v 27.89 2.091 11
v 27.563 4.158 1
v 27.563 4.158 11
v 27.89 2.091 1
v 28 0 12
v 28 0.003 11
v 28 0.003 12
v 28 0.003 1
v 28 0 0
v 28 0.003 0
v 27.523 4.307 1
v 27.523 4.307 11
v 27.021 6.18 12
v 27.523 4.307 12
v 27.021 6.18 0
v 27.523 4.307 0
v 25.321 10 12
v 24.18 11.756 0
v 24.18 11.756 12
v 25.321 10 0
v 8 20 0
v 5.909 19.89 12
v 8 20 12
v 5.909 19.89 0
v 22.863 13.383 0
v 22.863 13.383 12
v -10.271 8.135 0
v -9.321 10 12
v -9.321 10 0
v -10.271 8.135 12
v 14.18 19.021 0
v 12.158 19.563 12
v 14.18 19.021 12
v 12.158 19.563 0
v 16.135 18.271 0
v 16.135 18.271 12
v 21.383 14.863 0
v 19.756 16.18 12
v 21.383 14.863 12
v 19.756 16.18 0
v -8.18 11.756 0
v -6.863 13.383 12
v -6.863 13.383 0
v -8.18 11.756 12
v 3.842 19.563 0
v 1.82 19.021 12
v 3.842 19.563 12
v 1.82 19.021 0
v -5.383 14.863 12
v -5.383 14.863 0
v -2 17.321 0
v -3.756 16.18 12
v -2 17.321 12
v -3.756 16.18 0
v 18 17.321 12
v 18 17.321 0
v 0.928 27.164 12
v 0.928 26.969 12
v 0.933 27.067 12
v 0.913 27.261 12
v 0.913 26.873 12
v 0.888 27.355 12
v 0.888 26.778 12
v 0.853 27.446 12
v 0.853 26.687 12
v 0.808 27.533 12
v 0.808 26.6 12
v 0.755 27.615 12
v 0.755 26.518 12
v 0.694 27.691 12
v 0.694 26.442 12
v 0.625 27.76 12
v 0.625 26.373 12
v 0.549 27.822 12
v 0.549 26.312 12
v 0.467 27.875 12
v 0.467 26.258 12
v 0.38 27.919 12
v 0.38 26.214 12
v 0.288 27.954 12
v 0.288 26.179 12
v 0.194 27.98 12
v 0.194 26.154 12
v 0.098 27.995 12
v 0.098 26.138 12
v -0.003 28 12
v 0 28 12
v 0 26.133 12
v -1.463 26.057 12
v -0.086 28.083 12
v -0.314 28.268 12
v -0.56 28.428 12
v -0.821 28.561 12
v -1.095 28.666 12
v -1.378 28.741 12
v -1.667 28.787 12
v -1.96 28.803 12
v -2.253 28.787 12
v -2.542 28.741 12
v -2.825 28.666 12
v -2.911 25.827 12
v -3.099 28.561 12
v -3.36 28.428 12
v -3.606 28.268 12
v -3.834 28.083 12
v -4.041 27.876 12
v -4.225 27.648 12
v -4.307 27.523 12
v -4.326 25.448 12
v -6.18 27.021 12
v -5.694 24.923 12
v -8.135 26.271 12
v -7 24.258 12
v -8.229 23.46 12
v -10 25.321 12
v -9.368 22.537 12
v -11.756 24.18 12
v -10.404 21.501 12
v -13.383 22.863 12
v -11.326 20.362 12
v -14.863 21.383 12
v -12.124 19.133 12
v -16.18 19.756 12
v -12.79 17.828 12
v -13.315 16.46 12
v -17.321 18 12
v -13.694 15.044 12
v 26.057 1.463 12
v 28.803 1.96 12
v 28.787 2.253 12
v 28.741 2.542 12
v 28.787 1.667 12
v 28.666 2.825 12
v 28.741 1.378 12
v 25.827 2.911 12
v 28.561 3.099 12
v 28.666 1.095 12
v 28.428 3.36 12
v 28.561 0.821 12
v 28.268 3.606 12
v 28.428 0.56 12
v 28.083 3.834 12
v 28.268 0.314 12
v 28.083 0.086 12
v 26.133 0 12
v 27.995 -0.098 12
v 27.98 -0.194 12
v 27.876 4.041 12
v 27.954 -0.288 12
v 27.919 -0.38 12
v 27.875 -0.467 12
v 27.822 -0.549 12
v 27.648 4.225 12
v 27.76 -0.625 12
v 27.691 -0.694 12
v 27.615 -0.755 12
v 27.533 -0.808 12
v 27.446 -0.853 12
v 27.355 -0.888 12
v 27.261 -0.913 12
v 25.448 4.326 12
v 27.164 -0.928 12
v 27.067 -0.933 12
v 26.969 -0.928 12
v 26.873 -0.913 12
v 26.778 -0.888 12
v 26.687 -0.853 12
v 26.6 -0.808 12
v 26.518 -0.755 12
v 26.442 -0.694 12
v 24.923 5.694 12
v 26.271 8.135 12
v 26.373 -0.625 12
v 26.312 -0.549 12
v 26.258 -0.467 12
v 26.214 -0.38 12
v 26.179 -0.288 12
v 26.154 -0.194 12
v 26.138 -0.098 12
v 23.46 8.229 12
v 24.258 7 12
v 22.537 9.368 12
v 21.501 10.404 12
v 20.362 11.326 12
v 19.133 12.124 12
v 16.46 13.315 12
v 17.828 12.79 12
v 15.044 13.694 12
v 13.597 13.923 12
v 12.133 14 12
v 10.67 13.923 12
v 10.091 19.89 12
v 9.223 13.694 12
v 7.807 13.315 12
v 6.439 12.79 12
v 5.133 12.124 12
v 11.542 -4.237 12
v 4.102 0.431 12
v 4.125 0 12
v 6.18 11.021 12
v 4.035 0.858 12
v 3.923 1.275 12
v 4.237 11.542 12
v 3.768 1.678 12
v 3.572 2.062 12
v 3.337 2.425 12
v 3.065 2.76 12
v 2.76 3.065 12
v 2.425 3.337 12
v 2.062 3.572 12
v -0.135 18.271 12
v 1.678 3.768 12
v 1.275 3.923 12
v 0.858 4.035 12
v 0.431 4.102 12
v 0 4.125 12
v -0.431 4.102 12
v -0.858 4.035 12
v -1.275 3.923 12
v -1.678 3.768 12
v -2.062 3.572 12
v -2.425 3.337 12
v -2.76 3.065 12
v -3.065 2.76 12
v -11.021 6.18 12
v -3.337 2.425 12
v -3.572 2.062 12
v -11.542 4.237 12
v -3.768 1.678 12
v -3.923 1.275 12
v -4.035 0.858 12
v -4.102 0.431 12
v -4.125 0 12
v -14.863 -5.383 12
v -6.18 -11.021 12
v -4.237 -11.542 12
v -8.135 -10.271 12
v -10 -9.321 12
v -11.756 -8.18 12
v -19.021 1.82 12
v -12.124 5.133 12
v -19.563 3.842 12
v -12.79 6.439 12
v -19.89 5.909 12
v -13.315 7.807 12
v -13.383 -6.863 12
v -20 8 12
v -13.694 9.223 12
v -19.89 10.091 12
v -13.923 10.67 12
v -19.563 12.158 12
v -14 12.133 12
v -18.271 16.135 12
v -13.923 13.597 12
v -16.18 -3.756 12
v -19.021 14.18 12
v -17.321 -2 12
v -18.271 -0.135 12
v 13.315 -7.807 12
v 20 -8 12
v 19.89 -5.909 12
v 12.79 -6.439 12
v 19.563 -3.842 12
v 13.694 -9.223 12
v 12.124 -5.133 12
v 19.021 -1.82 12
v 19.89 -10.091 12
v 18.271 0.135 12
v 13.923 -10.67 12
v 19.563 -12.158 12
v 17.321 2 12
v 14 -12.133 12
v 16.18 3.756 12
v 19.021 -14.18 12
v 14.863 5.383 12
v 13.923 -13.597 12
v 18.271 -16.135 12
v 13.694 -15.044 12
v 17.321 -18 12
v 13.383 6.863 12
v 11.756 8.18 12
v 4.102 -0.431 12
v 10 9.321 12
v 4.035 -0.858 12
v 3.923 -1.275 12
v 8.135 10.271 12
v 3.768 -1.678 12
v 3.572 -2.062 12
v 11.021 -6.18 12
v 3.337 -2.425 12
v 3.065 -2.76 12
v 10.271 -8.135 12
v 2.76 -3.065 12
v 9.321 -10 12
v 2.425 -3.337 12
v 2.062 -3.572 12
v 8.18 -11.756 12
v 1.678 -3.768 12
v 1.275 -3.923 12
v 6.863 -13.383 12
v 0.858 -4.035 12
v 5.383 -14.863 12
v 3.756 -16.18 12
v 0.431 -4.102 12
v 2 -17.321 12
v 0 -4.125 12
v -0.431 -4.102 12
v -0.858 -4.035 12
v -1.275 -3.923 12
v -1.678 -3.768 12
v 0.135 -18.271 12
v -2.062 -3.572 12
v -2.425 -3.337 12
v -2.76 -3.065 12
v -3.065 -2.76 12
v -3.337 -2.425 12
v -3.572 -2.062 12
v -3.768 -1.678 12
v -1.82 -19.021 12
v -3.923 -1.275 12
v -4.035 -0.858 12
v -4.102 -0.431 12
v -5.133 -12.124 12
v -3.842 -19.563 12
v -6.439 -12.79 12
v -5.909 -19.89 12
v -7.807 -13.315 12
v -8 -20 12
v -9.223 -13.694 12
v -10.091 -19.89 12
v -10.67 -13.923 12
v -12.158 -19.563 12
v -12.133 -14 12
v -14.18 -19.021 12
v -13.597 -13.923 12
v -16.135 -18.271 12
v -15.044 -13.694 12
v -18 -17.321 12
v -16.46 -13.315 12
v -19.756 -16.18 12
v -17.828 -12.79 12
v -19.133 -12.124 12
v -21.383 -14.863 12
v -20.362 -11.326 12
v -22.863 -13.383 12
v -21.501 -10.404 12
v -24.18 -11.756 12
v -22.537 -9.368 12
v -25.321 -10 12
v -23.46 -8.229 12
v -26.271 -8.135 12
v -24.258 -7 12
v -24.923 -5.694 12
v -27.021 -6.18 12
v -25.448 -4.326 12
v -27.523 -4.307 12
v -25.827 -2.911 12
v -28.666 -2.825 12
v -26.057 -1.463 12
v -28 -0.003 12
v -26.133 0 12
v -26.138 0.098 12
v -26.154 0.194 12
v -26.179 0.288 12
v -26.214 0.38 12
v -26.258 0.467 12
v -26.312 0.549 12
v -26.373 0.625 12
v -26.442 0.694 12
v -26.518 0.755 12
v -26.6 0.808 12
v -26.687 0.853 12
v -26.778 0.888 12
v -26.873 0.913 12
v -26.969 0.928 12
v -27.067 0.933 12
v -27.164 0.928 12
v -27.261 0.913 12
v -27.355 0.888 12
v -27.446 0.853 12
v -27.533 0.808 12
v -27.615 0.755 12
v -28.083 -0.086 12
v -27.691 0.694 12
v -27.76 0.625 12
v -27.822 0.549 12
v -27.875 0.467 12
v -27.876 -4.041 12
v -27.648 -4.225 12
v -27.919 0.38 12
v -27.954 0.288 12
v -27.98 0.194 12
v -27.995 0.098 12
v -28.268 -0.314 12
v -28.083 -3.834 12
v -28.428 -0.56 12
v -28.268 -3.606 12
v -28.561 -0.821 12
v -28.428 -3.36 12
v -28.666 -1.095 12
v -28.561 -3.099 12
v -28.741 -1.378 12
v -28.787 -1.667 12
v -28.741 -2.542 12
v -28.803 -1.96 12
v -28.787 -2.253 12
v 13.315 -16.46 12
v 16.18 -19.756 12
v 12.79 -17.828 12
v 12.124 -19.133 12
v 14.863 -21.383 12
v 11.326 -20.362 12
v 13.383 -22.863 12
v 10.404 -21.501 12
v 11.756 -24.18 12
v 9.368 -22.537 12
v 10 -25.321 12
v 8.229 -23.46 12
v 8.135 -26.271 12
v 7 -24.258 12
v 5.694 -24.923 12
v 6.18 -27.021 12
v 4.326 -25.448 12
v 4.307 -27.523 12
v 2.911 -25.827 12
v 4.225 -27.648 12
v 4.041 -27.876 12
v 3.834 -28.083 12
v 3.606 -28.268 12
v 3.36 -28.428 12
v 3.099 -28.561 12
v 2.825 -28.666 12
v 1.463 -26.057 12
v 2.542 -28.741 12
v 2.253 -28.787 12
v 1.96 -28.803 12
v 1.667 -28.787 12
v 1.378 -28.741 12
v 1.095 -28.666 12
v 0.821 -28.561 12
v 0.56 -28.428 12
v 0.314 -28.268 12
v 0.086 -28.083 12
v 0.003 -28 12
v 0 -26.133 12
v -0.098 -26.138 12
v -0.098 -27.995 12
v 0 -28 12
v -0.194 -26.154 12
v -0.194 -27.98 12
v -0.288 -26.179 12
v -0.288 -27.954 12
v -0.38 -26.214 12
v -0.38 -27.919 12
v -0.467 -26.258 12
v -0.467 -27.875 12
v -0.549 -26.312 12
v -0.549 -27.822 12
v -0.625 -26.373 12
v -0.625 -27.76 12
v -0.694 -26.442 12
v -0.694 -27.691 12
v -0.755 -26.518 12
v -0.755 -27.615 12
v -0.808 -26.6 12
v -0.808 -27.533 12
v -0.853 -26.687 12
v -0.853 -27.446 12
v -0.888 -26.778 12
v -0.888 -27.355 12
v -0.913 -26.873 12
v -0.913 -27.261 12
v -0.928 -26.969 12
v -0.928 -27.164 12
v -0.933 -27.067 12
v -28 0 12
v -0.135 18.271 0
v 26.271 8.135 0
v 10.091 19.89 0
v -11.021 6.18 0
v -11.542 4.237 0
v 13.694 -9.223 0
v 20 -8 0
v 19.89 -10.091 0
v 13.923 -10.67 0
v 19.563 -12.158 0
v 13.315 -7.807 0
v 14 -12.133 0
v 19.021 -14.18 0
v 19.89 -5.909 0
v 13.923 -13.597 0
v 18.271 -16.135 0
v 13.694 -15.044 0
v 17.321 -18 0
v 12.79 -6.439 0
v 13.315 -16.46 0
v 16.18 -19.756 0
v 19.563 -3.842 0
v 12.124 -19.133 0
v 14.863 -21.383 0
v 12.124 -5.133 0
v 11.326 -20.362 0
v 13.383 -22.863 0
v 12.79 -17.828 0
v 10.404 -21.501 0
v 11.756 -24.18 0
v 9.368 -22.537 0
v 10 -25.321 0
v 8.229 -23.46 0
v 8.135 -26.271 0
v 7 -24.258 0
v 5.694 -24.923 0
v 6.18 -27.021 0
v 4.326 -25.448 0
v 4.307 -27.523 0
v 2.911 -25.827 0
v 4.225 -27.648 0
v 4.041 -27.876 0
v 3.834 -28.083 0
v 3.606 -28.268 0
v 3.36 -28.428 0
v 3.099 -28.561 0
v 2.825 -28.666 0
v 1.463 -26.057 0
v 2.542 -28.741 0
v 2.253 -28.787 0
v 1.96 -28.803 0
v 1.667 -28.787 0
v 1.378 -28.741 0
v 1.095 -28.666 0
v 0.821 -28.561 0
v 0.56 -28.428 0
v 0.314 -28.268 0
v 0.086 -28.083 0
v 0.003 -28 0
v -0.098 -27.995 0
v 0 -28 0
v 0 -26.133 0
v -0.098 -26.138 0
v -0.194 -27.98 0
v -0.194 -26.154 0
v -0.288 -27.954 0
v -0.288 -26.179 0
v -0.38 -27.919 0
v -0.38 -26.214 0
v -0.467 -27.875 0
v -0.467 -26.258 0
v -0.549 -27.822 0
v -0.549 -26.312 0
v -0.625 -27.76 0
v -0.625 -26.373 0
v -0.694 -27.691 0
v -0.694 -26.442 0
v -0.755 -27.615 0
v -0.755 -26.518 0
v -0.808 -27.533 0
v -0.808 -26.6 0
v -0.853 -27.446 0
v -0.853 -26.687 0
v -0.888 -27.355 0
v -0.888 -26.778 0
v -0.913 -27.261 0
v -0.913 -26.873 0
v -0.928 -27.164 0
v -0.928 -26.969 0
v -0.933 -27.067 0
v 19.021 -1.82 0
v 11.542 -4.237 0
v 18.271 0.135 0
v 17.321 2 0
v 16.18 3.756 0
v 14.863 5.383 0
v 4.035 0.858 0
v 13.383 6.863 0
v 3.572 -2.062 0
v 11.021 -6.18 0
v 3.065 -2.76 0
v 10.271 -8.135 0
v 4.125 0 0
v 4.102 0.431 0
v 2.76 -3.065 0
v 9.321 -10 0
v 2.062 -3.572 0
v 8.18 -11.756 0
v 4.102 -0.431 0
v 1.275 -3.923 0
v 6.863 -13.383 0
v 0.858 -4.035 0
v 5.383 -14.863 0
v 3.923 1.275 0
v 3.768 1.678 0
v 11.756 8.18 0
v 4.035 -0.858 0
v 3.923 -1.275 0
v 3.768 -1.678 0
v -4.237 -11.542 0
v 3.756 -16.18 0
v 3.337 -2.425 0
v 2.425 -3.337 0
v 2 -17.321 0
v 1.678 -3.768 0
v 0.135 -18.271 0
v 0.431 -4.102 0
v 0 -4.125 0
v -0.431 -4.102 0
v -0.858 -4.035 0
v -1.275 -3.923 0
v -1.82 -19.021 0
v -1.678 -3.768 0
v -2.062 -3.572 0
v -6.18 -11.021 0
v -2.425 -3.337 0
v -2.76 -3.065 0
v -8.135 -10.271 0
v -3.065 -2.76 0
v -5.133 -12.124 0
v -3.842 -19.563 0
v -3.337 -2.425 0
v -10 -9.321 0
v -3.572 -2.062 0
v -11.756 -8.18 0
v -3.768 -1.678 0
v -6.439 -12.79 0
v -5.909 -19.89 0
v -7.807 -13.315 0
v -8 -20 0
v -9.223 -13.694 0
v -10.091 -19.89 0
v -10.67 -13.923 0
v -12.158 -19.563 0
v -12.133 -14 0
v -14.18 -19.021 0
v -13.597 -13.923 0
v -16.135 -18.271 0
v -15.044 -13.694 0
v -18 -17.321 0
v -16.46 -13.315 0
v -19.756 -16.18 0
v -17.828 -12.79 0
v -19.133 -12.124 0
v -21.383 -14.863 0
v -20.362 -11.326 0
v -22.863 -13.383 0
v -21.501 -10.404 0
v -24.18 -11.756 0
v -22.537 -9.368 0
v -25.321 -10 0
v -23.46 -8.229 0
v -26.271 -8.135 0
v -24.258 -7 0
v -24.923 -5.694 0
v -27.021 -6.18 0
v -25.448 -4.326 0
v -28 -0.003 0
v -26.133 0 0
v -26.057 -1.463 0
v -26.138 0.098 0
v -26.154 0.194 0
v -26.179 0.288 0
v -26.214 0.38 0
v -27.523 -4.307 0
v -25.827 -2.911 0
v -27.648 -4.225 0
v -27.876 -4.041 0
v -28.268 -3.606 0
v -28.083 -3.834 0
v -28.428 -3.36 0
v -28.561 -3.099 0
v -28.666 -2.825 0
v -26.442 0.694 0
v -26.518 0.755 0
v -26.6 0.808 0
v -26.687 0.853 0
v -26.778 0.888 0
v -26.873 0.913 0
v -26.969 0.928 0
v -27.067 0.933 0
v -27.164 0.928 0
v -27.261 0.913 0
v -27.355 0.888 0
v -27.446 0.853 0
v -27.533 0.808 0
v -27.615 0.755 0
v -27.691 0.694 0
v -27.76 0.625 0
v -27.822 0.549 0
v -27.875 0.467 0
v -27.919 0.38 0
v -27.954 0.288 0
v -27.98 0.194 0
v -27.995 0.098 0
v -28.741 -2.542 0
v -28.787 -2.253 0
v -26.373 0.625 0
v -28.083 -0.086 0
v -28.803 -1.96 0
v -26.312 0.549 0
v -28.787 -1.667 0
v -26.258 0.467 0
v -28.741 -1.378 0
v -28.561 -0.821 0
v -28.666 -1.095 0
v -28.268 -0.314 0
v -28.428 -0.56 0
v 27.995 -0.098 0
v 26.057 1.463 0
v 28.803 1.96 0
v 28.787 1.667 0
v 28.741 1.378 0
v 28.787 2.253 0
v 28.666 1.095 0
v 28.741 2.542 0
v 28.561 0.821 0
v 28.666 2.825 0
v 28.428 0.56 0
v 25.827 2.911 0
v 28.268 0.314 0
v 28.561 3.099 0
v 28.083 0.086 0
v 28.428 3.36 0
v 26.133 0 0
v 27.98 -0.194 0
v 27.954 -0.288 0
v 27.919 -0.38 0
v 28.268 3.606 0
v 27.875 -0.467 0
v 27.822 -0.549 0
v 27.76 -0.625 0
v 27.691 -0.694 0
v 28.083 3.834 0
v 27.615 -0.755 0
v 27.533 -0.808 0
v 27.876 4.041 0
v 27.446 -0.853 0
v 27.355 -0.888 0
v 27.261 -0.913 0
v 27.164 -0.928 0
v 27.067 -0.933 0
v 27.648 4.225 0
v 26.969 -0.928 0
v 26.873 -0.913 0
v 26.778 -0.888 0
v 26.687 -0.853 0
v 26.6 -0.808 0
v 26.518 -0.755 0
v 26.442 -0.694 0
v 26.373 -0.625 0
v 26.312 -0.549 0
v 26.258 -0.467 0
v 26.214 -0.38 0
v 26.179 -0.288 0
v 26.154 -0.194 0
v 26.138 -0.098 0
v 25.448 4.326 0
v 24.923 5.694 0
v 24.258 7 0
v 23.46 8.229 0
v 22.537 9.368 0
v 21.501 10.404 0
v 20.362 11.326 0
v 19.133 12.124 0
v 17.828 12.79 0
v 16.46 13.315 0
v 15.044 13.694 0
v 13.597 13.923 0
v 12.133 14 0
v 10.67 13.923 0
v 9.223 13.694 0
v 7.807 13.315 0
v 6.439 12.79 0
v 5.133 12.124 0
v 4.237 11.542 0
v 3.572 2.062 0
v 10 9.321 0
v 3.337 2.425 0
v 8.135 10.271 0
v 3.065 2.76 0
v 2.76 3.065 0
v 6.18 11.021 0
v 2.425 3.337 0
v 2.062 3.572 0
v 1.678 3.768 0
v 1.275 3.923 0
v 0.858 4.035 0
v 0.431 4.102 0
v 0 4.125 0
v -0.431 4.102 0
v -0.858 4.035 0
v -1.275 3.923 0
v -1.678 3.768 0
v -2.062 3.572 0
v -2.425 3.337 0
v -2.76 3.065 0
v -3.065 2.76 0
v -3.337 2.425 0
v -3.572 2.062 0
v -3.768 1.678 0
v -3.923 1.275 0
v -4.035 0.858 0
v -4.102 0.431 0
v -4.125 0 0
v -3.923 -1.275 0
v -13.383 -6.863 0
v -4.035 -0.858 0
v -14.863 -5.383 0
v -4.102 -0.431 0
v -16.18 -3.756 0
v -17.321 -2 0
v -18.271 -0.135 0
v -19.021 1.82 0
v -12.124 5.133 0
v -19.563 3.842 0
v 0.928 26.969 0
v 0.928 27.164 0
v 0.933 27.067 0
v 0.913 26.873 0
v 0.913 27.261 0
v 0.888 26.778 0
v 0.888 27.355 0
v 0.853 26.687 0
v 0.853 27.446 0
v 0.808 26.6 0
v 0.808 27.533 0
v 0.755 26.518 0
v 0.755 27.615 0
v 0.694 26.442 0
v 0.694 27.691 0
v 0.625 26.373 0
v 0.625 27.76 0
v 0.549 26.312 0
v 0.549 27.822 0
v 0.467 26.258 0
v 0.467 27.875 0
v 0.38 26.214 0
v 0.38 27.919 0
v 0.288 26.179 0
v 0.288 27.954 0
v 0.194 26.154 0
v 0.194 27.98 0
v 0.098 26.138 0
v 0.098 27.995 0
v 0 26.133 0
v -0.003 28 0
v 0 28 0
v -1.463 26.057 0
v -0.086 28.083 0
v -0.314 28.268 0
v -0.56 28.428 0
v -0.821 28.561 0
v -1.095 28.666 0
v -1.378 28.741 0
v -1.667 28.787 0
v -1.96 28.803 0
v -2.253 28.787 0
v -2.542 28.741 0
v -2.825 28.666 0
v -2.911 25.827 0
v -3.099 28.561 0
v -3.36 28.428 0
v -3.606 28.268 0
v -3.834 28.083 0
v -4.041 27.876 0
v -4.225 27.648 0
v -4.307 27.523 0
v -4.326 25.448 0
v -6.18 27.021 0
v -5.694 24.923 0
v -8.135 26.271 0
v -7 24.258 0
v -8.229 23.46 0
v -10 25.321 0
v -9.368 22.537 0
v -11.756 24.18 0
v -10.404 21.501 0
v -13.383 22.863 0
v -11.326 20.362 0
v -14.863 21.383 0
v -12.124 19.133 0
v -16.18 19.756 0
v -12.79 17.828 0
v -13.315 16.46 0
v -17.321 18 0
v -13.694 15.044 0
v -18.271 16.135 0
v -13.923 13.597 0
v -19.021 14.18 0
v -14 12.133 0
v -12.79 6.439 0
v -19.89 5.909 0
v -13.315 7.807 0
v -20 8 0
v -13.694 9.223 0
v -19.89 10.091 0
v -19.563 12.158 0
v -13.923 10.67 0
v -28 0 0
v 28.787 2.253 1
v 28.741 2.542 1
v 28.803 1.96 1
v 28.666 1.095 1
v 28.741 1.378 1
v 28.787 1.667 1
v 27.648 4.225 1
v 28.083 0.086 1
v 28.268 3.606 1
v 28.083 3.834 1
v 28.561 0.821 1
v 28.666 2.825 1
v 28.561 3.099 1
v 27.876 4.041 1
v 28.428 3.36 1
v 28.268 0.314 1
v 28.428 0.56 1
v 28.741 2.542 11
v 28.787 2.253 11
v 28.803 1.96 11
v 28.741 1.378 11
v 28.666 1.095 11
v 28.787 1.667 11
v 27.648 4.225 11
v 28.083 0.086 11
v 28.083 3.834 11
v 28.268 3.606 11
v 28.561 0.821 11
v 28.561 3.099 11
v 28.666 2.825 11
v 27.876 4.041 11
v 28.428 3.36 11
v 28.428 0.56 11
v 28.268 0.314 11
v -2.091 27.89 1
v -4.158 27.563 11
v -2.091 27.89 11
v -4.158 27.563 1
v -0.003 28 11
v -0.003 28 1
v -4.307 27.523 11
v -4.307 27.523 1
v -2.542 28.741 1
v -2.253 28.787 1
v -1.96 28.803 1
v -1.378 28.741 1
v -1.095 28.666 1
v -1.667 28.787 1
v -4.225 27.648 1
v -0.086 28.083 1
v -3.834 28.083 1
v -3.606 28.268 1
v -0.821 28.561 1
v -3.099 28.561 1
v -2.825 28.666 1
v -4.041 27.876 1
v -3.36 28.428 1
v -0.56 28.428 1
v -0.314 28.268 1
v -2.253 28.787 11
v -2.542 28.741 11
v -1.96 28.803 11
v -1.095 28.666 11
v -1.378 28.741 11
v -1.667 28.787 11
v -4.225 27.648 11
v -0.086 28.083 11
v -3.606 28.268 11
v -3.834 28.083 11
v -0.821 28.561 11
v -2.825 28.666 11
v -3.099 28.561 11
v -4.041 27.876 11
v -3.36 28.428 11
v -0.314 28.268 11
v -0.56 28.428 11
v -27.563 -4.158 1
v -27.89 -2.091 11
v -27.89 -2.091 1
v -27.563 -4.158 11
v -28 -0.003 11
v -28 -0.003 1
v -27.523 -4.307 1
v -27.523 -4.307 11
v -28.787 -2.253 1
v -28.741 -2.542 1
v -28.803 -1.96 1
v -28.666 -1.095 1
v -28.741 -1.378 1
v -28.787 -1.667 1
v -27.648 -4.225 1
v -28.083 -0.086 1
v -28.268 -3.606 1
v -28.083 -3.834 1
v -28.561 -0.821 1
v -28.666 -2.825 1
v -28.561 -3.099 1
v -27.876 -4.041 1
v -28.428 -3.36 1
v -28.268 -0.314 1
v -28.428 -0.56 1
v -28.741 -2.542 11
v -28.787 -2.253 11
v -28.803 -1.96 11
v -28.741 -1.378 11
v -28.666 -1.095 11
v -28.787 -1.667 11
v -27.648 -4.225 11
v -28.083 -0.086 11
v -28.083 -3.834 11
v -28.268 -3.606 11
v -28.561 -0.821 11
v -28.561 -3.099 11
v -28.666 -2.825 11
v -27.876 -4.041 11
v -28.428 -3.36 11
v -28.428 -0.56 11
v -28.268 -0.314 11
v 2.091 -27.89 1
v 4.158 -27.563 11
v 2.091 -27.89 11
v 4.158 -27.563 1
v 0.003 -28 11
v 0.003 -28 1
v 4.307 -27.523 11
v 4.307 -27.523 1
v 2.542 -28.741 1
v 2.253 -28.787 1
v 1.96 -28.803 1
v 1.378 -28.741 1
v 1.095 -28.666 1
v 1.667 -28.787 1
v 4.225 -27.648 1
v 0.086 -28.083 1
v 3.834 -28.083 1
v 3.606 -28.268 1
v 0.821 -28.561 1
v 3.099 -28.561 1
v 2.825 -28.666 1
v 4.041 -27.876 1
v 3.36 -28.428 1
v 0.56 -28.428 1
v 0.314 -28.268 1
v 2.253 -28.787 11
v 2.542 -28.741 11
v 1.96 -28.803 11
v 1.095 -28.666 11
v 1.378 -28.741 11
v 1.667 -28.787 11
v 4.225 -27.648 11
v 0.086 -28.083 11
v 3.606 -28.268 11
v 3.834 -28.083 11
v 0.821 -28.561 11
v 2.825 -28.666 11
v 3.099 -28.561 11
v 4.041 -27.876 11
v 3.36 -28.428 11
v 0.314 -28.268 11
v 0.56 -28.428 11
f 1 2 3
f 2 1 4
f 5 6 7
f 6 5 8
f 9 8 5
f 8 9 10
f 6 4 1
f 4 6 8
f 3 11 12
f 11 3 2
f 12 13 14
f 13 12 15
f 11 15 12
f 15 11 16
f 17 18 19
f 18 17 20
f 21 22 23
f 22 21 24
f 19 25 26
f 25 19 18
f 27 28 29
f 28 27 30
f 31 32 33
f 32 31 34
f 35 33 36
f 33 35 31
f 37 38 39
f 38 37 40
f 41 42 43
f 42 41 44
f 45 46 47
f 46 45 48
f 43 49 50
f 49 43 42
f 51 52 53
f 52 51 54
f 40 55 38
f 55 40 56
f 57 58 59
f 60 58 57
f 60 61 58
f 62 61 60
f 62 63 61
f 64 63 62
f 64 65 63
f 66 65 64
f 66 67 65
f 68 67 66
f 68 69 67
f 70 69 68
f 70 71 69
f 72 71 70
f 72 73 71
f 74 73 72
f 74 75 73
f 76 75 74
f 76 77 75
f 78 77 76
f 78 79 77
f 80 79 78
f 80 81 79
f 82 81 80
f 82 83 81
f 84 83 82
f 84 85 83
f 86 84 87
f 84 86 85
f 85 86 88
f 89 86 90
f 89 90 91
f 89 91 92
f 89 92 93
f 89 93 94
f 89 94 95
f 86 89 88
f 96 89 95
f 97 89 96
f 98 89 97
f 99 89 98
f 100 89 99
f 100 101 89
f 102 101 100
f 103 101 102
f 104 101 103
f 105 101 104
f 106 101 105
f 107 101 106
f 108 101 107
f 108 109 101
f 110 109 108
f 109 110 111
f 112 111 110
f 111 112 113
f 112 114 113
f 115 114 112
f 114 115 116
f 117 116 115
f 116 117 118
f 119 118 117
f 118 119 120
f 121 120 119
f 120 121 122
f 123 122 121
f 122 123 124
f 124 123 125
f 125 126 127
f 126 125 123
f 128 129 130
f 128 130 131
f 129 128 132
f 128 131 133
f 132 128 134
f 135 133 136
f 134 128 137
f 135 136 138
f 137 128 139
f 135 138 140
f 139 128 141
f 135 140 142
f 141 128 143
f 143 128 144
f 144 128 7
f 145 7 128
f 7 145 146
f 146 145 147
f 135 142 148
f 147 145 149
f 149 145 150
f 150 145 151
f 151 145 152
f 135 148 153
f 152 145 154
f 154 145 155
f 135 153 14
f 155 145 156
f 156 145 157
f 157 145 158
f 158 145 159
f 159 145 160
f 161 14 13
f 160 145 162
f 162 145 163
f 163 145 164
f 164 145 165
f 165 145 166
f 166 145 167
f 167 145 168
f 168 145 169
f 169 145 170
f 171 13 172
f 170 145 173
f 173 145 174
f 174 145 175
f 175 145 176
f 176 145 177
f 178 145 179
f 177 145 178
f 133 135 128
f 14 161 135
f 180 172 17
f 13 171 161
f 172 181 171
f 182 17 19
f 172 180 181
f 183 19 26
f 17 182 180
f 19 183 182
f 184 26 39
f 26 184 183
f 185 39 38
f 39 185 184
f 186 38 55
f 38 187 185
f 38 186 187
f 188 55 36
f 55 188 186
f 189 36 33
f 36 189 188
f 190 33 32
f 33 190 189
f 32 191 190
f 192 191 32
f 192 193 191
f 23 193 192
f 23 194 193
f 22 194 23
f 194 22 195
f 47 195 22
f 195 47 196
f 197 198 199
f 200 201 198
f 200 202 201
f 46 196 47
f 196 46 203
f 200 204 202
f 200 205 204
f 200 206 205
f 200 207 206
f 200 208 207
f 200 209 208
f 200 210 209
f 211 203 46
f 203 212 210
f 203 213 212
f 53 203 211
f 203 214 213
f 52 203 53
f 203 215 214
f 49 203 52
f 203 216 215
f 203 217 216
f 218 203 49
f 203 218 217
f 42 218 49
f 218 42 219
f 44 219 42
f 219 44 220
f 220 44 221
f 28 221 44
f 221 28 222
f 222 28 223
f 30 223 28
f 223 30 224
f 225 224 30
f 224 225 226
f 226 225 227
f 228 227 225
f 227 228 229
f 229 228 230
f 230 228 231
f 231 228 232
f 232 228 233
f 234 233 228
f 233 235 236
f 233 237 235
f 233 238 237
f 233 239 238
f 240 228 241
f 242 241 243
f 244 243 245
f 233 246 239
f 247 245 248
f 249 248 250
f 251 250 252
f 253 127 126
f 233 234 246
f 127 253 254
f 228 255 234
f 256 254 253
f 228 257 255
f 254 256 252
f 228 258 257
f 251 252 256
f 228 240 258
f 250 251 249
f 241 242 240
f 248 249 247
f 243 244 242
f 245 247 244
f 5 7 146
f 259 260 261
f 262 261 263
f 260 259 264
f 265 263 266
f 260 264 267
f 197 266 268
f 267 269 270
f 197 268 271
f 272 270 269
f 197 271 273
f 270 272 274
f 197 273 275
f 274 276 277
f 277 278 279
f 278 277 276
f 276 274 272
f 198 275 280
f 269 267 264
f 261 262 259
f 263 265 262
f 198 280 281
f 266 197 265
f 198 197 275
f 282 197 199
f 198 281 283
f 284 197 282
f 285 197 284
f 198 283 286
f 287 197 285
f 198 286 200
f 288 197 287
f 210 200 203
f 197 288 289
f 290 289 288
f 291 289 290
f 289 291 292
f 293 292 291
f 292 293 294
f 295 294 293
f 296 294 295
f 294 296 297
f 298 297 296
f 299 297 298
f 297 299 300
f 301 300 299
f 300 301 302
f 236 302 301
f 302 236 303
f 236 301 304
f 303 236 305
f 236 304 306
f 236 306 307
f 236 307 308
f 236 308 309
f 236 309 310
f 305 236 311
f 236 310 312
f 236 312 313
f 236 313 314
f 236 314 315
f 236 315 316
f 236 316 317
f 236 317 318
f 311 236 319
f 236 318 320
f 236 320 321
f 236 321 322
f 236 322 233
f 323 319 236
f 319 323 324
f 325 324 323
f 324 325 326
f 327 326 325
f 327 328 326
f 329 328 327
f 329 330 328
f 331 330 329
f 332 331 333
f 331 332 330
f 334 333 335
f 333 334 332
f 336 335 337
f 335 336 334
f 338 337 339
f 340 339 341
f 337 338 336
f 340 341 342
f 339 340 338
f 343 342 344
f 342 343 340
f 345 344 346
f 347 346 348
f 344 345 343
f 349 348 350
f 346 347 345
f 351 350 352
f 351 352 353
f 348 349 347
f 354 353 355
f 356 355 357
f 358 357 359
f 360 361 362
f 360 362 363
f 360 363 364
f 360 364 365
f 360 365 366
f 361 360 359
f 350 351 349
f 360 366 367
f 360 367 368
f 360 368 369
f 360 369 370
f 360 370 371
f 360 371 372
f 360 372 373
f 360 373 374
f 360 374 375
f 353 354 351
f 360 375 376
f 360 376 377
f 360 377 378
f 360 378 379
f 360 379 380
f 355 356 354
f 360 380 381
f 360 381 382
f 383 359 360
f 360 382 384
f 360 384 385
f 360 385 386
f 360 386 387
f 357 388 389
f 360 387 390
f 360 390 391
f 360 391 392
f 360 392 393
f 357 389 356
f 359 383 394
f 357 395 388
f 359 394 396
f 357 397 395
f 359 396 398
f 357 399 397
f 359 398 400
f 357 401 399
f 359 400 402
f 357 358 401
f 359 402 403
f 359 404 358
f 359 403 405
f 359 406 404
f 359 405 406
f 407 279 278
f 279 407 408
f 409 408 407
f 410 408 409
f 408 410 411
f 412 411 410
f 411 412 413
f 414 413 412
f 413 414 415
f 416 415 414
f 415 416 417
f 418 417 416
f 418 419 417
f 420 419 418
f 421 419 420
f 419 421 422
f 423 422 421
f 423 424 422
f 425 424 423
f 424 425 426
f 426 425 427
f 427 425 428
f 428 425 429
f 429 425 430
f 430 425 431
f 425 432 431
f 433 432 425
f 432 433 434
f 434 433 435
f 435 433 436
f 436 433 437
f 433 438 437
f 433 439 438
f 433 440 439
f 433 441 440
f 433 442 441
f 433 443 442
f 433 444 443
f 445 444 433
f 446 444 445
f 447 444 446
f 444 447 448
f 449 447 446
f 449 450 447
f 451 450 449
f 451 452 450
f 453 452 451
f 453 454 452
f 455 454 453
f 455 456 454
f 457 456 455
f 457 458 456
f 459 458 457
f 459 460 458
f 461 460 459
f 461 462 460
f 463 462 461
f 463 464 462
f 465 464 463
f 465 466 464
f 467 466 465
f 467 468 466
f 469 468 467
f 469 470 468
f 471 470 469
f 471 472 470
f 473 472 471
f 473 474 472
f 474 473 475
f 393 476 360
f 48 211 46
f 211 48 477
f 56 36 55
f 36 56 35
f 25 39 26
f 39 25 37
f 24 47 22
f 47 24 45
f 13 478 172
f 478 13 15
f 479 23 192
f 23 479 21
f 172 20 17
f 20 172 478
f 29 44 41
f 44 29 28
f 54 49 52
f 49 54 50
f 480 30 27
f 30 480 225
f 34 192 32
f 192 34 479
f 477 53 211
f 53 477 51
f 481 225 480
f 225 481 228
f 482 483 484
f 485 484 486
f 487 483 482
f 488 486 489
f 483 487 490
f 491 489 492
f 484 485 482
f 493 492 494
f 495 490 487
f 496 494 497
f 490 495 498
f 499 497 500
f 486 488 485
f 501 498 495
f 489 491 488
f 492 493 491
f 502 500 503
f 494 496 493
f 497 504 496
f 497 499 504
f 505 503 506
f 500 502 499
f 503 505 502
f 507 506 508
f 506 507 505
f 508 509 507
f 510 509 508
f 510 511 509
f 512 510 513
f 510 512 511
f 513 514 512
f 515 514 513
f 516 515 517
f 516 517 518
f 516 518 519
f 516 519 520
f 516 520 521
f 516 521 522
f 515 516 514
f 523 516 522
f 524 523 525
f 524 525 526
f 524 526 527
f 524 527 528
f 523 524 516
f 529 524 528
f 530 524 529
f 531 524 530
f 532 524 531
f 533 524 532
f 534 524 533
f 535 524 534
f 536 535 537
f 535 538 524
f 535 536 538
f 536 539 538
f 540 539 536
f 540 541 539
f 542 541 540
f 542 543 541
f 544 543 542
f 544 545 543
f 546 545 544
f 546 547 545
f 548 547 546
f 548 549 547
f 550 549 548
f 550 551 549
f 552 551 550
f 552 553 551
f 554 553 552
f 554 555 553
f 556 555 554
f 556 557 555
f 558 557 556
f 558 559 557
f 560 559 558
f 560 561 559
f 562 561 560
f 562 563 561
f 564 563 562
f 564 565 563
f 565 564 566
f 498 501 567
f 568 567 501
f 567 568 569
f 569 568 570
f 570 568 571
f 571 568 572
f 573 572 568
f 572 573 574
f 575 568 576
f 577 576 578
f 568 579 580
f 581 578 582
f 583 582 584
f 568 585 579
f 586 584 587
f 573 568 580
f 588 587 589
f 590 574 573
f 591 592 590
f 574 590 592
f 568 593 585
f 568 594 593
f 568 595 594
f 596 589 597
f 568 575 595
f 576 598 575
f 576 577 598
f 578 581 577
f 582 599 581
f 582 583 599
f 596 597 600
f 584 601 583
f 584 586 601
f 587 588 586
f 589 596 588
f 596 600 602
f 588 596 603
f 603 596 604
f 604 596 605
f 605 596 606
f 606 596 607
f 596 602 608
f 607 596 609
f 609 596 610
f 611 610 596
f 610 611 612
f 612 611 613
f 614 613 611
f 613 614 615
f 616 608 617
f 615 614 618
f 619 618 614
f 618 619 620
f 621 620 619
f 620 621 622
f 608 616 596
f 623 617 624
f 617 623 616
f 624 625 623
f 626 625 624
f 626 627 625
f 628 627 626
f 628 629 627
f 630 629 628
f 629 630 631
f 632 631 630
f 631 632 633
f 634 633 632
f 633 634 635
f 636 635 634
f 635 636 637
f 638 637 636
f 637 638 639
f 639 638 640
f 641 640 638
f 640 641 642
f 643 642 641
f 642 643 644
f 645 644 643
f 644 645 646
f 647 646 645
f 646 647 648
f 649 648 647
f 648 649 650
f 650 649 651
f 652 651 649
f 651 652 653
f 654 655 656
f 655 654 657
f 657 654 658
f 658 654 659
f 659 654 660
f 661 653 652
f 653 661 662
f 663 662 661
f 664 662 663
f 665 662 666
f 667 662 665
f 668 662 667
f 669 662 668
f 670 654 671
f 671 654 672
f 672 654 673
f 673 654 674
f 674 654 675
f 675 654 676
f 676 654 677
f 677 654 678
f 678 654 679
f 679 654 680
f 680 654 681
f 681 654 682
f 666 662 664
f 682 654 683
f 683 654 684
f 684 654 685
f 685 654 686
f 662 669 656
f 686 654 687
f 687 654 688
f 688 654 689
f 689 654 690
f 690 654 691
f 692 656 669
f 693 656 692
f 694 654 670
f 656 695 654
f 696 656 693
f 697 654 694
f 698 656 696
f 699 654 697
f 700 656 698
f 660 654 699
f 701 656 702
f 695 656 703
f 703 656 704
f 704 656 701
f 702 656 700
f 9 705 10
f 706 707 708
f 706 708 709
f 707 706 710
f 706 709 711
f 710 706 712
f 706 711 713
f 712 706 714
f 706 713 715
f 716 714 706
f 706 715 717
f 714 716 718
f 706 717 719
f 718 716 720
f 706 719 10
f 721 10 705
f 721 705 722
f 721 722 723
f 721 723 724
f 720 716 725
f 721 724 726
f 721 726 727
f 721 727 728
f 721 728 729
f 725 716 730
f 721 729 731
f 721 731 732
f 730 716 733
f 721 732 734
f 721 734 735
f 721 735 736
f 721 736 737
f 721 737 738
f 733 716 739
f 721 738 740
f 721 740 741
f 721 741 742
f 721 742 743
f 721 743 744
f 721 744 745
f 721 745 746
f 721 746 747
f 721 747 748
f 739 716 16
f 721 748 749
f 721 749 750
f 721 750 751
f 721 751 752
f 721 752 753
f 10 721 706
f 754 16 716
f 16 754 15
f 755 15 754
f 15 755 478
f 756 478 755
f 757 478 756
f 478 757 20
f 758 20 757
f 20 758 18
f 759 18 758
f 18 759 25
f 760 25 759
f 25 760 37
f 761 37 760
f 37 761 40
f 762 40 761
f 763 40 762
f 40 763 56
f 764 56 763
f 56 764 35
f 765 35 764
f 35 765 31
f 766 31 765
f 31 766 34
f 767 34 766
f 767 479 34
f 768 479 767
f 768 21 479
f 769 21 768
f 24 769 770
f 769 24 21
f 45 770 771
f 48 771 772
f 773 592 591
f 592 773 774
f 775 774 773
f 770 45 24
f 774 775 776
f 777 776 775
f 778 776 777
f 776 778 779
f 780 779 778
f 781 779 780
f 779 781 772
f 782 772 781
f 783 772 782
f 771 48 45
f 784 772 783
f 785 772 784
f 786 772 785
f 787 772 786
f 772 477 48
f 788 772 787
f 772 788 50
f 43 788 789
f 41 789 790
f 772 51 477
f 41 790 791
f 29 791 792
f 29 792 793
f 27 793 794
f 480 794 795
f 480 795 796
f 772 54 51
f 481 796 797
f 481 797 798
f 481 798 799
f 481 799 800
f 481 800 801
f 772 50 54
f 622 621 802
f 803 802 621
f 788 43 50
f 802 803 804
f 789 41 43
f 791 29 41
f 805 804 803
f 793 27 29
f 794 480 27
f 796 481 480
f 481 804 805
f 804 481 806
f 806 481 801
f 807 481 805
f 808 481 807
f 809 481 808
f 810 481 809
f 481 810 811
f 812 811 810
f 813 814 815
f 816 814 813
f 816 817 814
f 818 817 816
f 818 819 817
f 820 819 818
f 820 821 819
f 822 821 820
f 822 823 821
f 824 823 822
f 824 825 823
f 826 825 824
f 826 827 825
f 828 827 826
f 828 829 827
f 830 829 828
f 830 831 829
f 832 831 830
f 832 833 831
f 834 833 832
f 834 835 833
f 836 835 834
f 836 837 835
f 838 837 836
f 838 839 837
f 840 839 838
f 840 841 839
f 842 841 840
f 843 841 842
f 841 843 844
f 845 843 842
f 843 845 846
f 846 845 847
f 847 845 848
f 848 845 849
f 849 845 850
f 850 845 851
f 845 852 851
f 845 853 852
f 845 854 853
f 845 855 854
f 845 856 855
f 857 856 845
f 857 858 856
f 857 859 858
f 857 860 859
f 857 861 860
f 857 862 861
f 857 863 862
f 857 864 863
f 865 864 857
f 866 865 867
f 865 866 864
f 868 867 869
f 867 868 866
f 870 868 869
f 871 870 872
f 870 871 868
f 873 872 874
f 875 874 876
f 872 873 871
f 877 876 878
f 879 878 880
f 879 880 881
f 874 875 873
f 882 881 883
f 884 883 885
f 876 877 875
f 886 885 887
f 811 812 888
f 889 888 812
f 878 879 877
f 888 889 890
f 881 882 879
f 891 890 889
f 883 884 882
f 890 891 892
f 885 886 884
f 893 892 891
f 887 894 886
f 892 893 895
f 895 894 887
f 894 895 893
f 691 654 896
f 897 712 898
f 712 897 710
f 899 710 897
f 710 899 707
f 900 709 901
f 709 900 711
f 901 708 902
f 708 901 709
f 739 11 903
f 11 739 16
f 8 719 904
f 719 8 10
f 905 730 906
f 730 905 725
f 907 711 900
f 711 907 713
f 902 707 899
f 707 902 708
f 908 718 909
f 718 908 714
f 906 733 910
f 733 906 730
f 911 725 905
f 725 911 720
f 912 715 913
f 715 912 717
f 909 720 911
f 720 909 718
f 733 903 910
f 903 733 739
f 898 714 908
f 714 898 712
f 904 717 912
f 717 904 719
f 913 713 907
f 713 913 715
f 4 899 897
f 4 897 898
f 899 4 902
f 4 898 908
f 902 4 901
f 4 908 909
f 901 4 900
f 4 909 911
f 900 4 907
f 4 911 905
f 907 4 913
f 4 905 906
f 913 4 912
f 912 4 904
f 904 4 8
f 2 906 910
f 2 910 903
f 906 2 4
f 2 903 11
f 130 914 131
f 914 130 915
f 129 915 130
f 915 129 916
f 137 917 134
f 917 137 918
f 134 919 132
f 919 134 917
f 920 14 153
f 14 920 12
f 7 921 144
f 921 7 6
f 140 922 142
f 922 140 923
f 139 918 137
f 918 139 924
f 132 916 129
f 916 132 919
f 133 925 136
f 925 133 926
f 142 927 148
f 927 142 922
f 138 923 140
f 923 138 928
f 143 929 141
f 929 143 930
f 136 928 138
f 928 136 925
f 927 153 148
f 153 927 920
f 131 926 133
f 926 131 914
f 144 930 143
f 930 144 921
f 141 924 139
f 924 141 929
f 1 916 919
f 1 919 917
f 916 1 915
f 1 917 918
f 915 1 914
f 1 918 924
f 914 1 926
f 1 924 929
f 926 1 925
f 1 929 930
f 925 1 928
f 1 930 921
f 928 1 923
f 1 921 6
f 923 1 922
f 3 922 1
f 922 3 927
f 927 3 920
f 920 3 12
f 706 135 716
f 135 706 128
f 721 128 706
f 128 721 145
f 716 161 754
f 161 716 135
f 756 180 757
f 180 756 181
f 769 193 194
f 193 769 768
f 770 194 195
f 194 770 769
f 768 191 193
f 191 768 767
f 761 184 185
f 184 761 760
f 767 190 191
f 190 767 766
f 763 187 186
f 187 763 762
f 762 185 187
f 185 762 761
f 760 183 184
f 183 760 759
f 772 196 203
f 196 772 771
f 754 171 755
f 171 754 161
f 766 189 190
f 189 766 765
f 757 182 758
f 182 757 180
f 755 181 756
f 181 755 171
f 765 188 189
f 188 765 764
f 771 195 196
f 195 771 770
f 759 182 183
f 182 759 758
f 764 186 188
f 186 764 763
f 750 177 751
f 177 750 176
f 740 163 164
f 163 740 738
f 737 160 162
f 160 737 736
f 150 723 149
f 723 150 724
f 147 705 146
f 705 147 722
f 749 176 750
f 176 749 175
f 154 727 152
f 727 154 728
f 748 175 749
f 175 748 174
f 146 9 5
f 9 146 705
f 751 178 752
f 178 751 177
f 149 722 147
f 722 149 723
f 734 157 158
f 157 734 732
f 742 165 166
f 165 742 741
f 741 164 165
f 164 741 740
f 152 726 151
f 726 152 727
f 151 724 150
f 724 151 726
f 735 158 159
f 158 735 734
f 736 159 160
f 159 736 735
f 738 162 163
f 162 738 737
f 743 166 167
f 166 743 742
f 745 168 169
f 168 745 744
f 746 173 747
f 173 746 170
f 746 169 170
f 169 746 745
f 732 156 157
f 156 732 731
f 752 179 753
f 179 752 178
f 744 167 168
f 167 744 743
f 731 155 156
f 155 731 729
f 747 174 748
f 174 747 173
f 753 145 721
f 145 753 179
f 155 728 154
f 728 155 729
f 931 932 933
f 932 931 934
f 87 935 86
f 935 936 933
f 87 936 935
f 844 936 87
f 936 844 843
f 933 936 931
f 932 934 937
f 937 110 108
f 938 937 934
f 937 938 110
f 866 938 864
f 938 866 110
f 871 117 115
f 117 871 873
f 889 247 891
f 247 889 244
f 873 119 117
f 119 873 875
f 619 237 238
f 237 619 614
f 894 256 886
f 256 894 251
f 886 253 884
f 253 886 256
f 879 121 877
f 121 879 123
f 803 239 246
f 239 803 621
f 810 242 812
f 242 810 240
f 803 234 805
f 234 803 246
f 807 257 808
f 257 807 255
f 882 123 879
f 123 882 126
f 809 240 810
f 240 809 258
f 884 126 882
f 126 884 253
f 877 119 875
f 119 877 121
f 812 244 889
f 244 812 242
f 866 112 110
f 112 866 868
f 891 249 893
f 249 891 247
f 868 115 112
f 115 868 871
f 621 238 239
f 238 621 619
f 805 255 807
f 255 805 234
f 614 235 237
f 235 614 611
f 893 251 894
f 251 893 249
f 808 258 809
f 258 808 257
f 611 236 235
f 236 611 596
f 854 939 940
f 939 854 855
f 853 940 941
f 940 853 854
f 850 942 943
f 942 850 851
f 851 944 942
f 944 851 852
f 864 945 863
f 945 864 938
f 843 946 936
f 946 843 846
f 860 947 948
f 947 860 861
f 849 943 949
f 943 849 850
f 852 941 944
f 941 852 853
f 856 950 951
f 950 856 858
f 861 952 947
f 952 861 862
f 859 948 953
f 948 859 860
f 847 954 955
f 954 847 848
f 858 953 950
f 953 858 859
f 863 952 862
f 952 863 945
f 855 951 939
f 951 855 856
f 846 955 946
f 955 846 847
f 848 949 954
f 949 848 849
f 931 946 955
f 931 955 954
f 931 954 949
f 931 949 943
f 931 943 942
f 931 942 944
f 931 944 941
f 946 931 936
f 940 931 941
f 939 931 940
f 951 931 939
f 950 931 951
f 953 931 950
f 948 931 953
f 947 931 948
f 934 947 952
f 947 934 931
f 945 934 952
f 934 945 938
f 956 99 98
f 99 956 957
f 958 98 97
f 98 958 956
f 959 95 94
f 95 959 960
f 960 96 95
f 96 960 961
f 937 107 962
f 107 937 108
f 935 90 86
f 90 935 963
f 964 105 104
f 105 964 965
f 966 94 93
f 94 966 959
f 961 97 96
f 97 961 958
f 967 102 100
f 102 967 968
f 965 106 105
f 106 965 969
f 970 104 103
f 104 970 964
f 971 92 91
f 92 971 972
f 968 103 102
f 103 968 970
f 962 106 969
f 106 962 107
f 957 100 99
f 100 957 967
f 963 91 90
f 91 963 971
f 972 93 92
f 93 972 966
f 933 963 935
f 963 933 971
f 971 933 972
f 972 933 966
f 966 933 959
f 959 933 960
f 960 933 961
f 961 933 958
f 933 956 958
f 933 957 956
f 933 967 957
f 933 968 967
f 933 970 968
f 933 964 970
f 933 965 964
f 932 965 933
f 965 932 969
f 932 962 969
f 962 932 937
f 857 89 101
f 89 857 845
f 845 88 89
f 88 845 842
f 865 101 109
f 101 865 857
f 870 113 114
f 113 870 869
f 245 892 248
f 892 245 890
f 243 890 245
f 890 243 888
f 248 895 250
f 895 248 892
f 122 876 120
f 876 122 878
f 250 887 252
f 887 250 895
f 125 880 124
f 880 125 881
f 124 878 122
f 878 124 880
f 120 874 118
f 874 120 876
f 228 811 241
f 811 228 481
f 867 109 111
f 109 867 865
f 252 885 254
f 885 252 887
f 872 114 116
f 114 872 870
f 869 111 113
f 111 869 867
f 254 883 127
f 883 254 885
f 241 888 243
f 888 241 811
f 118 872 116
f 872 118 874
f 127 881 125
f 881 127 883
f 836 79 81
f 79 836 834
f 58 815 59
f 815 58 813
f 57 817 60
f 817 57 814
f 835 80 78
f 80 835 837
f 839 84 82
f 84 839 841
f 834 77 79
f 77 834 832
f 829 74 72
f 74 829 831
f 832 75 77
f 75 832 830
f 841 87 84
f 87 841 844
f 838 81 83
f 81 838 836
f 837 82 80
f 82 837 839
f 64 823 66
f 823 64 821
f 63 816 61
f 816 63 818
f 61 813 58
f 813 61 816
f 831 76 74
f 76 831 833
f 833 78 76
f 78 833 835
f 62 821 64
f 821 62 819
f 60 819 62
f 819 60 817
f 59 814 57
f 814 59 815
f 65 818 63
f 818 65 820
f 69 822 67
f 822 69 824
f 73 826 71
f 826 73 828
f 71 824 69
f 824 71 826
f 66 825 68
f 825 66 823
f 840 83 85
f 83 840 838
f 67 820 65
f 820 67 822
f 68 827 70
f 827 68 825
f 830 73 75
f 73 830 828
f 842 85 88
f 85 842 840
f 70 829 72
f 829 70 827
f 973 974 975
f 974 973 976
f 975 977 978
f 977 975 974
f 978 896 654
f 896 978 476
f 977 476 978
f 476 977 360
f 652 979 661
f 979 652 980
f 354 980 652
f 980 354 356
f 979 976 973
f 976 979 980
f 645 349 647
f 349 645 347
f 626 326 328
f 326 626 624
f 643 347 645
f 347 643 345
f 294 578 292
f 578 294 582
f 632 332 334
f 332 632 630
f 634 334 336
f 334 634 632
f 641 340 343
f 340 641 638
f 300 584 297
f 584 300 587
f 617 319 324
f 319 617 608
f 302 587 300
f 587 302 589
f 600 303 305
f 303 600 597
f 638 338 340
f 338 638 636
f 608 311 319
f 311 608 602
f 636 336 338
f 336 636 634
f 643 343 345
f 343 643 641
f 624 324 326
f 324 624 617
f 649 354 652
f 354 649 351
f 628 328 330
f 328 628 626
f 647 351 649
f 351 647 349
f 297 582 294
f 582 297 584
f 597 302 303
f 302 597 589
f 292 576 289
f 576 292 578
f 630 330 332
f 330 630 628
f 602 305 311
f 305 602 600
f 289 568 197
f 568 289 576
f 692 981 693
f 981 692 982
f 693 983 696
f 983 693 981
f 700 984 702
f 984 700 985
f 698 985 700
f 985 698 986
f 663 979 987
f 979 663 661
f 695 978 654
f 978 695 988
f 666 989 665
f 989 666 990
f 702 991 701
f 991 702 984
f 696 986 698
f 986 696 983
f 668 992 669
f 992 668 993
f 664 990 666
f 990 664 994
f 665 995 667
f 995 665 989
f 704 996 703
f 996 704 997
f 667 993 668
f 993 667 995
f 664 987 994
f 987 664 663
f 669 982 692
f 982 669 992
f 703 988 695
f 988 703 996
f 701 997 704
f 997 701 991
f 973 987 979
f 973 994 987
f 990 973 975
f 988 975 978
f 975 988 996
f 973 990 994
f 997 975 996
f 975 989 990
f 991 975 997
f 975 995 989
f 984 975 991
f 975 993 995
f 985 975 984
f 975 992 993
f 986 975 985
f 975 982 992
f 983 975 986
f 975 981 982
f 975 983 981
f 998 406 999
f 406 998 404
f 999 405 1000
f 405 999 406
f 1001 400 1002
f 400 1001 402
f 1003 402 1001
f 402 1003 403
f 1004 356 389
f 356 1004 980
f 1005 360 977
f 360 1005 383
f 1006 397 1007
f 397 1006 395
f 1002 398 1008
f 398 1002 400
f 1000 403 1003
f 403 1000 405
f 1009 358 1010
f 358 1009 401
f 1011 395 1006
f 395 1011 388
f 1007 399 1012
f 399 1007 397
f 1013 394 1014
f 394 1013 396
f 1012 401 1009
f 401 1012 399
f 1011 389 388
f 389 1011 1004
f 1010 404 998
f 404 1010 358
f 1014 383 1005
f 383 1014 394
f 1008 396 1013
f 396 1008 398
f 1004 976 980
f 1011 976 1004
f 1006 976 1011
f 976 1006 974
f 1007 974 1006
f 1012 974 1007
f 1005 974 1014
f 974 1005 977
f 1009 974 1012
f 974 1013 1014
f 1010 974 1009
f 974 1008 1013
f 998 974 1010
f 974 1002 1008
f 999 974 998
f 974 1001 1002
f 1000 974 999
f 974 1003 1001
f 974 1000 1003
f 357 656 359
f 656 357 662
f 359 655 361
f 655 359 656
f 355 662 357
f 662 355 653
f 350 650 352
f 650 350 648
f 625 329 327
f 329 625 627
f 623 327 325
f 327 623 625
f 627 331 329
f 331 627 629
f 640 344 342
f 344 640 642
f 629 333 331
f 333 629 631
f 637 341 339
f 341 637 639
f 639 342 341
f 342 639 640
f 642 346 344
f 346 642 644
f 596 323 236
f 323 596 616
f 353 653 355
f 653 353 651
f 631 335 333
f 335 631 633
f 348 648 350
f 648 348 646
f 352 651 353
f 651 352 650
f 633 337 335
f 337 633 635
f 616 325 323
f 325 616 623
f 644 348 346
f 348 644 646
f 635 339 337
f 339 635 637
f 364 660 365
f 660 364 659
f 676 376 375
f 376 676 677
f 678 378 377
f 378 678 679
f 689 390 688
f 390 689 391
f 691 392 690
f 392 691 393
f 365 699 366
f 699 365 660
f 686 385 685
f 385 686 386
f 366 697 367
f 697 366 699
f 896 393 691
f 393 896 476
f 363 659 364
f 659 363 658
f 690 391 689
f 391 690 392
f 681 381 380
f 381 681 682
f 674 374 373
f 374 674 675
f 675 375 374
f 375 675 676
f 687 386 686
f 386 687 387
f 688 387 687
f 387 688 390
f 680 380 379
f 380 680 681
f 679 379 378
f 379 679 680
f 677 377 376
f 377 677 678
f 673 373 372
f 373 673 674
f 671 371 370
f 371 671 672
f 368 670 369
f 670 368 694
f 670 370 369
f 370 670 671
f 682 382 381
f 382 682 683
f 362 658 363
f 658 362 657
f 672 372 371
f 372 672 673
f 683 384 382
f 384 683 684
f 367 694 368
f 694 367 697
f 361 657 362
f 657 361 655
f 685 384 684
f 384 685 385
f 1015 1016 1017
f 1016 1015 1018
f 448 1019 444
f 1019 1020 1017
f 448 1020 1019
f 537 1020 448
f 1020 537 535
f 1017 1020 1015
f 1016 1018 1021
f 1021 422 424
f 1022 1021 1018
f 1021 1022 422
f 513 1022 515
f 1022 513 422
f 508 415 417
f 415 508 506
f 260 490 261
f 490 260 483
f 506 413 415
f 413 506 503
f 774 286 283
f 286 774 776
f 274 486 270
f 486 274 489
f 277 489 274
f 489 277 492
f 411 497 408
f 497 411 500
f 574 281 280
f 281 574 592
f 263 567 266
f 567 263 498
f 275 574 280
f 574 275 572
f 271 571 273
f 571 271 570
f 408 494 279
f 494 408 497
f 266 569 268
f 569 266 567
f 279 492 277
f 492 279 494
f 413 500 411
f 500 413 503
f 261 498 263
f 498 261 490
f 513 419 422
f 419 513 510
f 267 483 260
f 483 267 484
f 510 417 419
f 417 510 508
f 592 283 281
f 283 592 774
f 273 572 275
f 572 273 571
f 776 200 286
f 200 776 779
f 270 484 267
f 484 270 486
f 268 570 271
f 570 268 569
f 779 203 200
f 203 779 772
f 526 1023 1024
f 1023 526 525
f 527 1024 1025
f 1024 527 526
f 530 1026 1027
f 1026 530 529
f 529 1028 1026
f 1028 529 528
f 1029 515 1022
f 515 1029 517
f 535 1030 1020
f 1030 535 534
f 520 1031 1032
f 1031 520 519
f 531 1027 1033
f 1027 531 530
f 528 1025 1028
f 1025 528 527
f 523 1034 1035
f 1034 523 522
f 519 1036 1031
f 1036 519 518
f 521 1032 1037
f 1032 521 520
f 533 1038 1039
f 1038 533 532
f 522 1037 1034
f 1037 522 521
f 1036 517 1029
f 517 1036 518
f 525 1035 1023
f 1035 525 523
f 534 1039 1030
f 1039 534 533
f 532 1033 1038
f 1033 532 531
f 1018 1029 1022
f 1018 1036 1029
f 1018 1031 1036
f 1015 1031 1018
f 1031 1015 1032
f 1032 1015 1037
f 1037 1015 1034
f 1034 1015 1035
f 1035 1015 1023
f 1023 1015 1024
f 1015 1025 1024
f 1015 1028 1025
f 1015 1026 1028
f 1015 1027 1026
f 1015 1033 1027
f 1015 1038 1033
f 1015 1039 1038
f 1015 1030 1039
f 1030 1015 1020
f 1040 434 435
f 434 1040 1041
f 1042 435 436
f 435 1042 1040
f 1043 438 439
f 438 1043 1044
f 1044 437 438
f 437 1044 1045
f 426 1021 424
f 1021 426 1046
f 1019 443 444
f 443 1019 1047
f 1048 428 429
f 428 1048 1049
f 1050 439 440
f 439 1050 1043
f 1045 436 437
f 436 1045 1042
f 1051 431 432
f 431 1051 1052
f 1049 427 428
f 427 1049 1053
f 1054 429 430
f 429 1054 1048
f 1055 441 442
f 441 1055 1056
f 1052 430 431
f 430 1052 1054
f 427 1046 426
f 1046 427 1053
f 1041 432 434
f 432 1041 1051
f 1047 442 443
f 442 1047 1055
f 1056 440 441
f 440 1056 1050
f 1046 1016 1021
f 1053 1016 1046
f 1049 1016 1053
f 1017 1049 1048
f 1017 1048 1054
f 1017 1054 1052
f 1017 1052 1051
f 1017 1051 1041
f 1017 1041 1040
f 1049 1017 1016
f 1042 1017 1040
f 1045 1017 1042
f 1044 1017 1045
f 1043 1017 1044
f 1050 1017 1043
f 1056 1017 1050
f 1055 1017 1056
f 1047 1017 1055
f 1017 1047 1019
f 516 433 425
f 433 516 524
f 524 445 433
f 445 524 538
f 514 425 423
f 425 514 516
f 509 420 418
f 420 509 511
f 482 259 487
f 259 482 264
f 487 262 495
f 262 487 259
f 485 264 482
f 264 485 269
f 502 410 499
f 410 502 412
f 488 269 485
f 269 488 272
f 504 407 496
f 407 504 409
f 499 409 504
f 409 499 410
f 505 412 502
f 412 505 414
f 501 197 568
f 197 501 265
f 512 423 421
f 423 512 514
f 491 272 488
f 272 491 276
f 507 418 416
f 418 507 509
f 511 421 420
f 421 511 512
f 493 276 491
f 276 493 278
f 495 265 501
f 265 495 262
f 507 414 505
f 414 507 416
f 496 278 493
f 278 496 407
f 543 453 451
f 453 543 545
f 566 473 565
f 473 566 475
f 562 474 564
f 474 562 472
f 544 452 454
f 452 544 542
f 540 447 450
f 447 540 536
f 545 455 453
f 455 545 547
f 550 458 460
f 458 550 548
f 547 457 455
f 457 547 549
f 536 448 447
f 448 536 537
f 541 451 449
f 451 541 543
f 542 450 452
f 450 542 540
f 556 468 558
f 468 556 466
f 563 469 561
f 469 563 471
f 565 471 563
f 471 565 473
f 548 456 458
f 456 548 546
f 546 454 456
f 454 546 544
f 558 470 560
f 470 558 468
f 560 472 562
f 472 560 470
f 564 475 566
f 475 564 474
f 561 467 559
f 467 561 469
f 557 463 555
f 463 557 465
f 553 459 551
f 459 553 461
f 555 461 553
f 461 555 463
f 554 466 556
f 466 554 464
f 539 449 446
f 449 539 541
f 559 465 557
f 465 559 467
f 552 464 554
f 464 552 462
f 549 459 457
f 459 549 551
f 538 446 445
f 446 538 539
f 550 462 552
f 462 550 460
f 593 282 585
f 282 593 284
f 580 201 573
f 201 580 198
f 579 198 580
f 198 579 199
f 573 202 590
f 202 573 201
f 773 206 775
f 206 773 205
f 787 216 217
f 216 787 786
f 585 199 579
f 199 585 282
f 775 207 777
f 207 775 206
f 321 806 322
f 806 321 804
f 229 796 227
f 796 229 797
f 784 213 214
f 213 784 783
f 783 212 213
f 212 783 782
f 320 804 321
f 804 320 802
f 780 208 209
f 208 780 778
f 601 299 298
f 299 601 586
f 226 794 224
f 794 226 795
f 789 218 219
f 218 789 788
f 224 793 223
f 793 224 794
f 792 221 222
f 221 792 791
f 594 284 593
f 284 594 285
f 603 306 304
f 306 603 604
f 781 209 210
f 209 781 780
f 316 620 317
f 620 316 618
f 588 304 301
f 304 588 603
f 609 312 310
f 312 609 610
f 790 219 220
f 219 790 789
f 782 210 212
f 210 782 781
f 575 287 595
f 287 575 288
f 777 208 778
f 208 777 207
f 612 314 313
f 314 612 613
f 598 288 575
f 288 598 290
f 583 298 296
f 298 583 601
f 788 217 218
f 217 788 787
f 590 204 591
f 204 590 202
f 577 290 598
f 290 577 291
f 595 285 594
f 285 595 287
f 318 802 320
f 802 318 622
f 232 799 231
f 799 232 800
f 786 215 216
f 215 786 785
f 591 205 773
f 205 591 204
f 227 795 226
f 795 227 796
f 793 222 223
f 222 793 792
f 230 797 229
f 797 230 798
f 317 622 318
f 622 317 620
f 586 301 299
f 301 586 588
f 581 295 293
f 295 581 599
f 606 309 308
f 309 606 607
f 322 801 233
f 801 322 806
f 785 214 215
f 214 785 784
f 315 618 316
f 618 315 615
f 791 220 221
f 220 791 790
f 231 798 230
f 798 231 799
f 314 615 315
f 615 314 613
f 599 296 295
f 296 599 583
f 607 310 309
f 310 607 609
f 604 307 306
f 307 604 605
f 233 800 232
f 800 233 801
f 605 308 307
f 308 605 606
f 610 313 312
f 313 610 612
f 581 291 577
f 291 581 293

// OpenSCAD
$fn=60;

// This should be 2mm larger that the hole in your spool. Eg. 60mm for a 58mm spool hole.
Hub_Diameter = 56;

// Hole in the hub for the spool rod. Should be slighly larger than the rod diameter.
Hole_Diameter = 8.25;

// Core of the hub. The default should usually be good, but you may need to adjust for very large hole or small hub.
Core_Diameter = 24;

// Thickness of the hub. It should at least 2mm thicker than the wall of your spool to cater for the catch on the hub.
Thickness = 12;

// You need at least 3 to be stable, but feel free to go crazy with this one.
Number_of_Arms = 4;

/* [Hidden] */
Catch_Thickness = 1;
Core_Radius = Core_Diameter / 2;
Catch_Radius = Hub_Diameter / 60 * 3;
Catch_X = Hub_Diameter / 60 * 27.86;
Catch_Y = Hub_Diameter / 60 * 2.1;
Hub_Radius = Hub_Diameter / 2;
Arm_Radius = (Hub_Radius + Core_Radius)/2;
Arm_Inner_Radius = Hub_Diameter / 4;
Tip_Width = Hub_Diameter / 30;

$fs = 0.5;

module Arm(){
    difference(){
        union(){
            translate([Hub_Radius-Arm_Radius,0,0]) cylinder(r=Arm_Radius,h=Thickness);
            translate([Catch_X,Catch_Y,0]) cylinder(r=Catch_Radius,h=Catch_Thickness);
            translate([Catch_X,Catch_Y,Thickness-Catch_Thickness]) cylinder(r=Catch_Radius,h=Catch_Thickness);
        }
        translate([Hub_Radius-Arm_Inner_Radius-Tip_Width,0,-1]) cylinder(r=Arm_Inner_Radius,h=Thickness+2);
        translate([0,-Hub_Radius,0]) cube([Hub_Diameter,Hub_Diameter,Thickness*2+2],center=true);
    }
    translate([Hub_Radius-Tip_Width/2,0,0]) cylinder(d=Tip_Width,h=Thickness);
}

difference() {
    union() {
        cylinder(r=Core_Radius,h=Thickness);
        for (a =[0 : 360/Number_of_Arms : 360])
            rotate([0,0,a]) Arm();
    }
    translate([0,0,-1]) cylinder(d=Hole_Diameter,h=Thickness+2);
}
